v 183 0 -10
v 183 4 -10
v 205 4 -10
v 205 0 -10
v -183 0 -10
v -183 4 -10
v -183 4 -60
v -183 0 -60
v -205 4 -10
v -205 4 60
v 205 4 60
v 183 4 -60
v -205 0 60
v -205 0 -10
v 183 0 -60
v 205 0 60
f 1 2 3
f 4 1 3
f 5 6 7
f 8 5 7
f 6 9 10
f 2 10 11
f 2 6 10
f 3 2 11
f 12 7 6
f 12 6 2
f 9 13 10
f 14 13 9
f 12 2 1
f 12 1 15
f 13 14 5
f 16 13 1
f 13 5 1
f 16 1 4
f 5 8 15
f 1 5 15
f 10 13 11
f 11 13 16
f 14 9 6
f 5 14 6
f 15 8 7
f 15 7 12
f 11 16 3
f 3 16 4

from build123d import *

# Parameters (mm, degrees)
SKETCH1_W           = 410
SKETCH1_H           = 120
BOSS_EXTRUDE1_DEPTH = 4
CUT_EXTRUDE1_REACH  = 215.638
SKETCH2_W           = 50.170218681
SKETCH2_H           = 70.735007755


with BuildPart() as part:
    # Sketch1 → Boss-Extrude1 (new body)
    with BuildSketch(Plane(origin=(0, 0, 0), x_dir=(1, 0, 0), z_dir=(0, 1, 0))):
        Rectangle(SKETCH1_W, SKETCH1_H)
    extrude(amount=BOSS_EXTRUDE1_DEPTH)

    # Sketch2 → Cut-Extrude1 (cut, up to next)
    with BuildSketch(Plane(origin=(0, 4, 0), x_dir=(1, 0, 0), z_dir=(0, 1, 0)), mode=Mode.PRIVATE) as cut_extrude1_sk1:
        with Locations((208.085109341, 45.367503877)):
            Rectangle(SKETCH2_W, SKETCH2_H)
    cut_extrude1_tool1 = extrude(cut_extrude1_sk1.sketch, amount=-CUT_EXTRUDE1_REACH, mode=Mode.PRIVATE) & part.part
    # Sketch2 → Cut-Extrude1 (cut, up to next)
    with BuildSketch(Plane(origin=(0, 4, 0), x_dir=(1, 0, 0), z_dir=(0, 1, 0)), mode=Mode.PRIVATE) as cut_extrude1_sk2:
        with Locations((-208.085109341, 45.367503877)):
            Rectangle(SKETCH2_W, SKETCH2_H)
    cut_extrude1_tool2 = extrude(cut_extrude1_sk2.sketch, amount=-CUT_EXTRUDE1_REACH, mode=Mode.PRIVATE) & part.part
    add(cut_extrude1_tool1.solids().sort_by_distance((208.085109, 4, -45.367504))[0], mode=Mode.SUBTRACT)
    add(cut_extrude1_tool2.solids().sort_by_distance((-208.085109, 4, -45.367504))[0], mode=Mode.SUBTRACT)


solid = part.part
